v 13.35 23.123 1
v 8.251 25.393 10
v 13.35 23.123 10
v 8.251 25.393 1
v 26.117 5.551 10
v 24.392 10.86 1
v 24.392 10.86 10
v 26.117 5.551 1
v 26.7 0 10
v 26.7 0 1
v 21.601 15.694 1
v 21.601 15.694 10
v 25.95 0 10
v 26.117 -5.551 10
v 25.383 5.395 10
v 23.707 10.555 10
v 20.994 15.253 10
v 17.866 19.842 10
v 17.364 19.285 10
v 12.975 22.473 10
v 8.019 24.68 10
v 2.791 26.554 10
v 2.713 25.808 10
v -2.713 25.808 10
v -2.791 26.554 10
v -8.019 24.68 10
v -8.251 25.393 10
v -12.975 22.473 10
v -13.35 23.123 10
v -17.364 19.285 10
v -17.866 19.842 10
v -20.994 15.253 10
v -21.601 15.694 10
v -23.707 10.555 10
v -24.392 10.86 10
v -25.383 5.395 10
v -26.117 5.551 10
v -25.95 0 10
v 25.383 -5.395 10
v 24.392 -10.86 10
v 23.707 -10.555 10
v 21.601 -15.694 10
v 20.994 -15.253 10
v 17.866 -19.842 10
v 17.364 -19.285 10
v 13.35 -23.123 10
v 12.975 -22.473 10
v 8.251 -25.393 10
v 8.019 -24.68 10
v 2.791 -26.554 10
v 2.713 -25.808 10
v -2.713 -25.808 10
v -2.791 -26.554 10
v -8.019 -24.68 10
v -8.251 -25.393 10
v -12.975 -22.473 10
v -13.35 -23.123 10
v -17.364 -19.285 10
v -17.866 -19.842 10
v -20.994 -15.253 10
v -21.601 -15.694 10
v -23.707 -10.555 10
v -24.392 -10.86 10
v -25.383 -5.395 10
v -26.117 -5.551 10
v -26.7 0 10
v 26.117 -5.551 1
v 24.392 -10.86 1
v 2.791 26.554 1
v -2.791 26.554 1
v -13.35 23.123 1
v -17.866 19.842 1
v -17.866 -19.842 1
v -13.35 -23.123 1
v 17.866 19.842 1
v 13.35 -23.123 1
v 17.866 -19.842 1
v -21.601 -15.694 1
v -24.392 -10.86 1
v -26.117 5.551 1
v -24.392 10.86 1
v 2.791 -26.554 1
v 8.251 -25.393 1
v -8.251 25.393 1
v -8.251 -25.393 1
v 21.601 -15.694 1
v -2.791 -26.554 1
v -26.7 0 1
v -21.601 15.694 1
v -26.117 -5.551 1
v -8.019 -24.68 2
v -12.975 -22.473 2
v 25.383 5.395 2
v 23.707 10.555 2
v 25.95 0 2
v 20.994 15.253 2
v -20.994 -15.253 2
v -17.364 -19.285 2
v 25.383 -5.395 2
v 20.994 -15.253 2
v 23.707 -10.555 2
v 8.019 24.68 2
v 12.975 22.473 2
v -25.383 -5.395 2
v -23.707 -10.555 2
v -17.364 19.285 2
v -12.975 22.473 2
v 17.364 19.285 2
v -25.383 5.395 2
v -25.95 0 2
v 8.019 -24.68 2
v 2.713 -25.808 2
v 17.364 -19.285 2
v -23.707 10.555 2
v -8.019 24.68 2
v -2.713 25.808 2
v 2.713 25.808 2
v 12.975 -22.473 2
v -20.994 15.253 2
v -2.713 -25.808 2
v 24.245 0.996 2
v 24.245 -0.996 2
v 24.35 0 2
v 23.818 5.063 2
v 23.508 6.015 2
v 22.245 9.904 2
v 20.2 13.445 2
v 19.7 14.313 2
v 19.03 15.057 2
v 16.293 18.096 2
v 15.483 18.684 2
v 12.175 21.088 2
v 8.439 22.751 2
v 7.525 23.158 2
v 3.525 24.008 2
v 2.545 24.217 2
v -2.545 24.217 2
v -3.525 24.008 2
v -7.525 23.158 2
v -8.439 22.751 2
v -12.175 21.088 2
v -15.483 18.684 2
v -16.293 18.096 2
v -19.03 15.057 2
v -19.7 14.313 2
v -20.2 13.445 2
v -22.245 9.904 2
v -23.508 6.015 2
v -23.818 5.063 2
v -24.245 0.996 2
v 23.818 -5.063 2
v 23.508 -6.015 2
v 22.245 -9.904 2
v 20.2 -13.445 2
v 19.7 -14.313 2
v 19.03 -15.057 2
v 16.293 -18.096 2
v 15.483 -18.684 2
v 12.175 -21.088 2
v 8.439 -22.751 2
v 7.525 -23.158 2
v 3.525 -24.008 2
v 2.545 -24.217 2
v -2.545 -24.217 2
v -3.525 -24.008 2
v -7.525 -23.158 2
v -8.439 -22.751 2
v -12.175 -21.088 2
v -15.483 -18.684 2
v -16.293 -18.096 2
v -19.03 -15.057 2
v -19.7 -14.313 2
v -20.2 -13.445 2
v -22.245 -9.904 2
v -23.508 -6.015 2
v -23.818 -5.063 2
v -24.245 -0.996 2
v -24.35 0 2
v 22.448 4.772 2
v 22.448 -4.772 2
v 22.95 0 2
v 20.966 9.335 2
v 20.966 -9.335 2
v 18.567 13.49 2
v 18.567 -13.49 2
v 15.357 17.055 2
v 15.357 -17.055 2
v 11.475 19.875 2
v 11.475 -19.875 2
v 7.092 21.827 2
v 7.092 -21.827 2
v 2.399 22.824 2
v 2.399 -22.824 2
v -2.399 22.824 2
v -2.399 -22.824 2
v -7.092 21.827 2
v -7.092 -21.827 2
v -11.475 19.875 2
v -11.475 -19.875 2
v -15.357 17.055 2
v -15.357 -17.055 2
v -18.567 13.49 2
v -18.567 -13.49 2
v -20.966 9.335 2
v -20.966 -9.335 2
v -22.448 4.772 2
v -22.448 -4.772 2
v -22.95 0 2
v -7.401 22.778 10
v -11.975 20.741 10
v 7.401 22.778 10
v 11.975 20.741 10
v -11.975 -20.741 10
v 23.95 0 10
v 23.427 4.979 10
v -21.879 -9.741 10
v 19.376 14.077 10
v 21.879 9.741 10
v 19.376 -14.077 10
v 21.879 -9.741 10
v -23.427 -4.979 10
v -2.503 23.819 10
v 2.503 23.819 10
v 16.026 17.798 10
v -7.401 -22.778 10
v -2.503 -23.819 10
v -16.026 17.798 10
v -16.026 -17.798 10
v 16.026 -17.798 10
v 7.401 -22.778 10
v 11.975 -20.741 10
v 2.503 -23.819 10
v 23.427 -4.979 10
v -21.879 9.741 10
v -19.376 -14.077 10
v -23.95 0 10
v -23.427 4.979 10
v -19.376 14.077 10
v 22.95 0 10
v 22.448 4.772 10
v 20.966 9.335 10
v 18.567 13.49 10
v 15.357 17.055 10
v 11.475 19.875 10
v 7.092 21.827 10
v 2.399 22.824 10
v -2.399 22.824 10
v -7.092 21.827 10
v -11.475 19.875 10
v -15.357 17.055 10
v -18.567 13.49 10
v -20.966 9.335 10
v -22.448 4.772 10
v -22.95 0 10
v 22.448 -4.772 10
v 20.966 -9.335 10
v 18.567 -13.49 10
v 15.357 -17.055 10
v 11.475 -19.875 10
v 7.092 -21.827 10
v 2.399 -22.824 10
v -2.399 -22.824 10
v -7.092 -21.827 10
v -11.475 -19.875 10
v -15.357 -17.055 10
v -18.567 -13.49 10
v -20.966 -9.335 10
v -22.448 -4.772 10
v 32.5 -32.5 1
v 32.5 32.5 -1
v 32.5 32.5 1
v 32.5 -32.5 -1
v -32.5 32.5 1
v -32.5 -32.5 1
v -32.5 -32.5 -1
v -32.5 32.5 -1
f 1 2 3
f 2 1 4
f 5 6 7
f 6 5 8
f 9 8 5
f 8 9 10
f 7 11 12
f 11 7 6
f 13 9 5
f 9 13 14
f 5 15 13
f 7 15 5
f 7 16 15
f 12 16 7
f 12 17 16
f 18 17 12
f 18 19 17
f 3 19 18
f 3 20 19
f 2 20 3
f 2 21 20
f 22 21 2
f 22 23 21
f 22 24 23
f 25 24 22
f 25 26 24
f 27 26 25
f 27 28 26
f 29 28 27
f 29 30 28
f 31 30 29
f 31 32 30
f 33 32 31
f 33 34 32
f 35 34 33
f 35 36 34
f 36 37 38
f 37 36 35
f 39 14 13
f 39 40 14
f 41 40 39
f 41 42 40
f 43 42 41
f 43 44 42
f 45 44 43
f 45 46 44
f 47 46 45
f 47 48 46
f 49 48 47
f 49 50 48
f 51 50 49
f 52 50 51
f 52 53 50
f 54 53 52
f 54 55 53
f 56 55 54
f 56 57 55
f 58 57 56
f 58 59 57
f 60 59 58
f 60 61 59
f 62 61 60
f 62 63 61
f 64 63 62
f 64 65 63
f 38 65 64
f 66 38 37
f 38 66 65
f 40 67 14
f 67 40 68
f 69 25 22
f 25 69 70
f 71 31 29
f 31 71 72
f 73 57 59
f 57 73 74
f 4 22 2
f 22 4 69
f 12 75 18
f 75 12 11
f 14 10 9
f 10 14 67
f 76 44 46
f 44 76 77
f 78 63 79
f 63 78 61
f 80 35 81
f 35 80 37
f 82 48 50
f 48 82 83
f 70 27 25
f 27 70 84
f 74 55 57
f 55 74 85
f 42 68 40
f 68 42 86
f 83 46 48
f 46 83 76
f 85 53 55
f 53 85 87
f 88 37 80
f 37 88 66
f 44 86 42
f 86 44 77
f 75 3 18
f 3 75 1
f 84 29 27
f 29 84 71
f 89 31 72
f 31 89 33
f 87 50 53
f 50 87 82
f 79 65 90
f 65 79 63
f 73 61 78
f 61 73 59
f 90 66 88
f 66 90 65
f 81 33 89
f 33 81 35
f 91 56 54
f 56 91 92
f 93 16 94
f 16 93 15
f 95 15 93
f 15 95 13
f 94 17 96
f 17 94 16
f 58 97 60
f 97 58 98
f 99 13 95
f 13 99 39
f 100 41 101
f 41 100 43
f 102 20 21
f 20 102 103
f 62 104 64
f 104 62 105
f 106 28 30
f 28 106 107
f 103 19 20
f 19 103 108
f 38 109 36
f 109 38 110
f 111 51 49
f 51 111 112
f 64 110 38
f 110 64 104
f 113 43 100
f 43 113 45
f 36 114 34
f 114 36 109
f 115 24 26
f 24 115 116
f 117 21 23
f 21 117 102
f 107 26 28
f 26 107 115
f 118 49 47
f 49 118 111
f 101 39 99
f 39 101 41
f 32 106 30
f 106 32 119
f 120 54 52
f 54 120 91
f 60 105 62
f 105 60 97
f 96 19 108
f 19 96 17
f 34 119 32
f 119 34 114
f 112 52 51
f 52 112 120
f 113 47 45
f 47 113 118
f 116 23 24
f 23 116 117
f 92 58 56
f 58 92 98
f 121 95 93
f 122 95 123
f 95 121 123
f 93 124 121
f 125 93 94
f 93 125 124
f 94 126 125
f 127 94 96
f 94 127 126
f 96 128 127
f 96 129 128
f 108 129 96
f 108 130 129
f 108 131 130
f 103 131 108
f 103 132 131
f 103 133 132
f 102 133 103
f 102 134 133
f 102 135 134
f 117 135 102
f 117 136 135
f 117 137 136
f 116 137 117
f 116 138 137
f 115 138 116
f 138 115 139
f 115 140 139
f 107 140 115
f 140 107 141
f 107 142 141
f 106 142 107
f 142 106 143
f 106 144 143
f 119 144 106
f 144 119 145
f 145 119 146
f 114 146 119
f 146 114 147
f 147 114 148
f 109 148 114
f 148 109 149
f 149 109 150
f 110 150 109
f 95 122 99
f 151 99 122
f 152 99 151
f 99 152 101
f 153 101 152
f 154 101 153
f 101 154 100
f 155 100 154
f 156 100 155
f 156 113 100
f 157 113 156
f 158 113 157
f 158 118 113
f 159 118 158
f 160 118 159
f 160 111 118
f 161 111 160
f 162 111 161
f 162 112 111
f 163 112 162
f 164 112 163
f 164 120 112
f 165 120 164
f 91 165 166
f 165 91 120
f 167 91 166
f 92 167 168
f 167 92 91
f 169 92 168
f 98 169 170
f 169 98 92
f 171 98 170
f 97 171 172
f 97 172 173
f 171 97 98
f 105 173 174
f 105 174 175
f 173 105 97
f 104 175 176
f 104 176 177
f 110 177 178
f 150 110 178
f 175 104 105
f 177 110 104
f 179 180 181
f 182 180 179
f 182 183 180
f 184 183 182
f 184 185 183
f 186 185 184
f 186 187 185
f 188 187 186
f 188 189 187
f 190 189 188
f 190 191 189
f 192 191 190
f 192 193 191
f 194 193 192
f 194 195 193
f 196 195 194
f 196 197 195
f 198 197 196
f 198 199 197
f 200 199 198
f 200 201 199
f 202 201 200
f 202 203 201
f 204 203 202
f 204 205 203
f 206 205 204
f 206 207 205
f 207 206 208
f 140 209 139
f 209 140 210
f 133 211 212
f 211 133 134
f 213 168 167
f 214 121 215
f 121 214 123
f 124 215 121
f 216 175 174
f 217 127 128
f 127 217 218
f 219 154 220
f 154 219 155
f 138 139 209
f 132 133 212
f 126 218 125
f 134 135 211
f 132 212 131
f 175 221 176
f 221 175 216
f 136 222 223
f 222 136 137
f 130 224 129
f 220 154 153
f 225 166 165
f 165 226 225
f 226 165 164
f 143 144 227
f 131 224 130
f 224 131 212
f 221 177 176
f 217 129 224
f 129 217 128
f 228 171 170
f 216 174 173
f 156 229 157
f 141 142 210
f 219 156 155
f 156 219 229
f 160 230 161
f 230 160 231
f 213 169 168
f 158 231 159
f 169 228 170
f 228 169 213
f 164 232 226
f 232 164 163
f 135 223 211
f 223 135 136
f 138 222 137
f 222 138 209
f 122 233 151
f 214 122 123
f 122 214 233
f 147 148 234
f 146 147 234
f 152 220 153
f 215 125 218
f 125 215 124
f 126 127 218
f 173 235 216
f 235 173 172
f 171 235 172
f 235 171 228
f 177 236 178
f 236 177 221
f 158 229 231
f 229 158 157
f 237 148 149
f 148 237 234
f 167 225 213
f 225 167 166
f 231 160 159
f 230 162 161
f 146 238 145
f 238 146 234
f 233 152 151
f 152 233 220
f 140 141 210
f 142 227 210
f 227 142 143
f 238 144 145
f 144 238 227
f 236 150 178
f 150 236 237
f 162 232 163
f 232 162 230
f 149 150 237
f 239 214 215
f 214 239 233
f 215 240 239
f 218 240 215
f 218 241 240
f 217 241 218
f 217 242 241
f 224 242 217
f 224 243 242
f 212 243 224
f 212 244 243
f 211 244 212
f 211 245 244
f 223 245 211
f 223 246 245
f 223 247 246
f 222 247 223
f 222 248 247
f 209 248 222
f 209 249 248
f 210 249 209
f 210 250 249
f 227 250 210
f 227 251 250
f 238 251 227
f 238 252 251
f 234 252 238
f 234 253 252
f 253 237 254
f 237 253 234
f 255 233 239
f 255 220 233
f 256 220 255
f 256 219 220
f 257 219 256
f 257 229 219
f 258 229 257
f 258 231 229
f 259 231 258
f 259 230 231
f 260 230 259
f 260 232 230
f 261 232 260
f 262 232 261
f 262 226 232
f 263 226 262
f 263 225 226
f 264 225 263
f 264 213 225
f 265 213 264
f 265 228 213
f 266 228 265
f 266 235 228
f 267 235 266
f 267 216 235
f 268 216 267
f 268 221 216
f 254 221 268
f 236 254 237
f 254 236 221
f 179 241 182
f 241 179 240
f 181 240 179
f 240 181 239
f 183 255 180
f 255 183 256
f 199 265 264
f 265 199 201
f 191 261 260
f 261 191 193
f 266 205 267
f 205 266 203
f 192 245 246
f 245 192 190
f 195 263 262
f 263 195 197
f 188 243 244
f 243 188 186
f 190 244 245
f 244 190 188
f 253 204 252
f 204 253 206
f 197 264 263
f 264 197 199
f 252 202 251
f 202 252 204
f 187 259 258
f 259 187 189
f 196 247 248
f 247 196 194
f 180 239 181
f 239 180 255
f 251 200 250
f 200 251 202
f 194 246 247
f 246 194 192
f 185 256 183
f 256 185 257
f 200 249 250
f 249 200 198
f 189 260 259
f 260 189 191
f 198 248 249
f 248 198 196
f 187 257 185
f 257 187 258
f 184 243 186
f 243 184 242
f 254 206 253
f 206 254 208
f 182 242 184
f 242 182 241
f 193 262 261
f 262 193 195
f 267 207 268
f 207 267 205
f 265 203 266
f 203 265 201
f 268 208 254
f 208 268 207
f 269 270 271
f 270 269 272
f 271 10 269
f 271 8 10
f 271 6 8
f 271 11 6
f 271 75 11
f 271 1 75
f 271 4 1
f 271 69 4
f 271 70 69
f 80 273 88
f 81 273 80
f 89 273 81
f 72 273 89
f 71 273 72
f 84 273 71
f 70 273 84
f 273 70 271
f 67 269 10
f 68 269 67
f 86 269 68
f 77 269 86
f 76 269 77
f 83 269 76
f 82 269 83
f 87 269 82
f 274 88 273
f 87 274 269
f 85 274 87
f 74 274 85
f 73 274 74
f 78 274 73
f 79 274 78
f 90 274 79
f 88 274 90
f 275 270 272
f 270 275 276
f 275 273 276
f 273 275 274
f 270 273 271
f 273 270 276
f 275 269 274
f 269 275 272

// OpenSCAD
//48.90, 51.45mm
wall_thickness = 1.5;    //Wall thickness
od=51.90;                //Outer diameter of tube       
id=48.90;                //Inner diameter of tube
difference(){                               //Comment to remove outer ring
    cylinder (10, d=od+wall_thickness);
    translate([0,0,2]){
    cylinder (8, d=od);
}}
difference(){                               // Comment to remove inner ring
    cylinder (10, d1=id,d2=id-1);
    translate([0,0,2]){
    cylinder (8, d=id-(2*wall_thickness));
}}

cube([65,65,2],center=true);                //Comment to remove base
